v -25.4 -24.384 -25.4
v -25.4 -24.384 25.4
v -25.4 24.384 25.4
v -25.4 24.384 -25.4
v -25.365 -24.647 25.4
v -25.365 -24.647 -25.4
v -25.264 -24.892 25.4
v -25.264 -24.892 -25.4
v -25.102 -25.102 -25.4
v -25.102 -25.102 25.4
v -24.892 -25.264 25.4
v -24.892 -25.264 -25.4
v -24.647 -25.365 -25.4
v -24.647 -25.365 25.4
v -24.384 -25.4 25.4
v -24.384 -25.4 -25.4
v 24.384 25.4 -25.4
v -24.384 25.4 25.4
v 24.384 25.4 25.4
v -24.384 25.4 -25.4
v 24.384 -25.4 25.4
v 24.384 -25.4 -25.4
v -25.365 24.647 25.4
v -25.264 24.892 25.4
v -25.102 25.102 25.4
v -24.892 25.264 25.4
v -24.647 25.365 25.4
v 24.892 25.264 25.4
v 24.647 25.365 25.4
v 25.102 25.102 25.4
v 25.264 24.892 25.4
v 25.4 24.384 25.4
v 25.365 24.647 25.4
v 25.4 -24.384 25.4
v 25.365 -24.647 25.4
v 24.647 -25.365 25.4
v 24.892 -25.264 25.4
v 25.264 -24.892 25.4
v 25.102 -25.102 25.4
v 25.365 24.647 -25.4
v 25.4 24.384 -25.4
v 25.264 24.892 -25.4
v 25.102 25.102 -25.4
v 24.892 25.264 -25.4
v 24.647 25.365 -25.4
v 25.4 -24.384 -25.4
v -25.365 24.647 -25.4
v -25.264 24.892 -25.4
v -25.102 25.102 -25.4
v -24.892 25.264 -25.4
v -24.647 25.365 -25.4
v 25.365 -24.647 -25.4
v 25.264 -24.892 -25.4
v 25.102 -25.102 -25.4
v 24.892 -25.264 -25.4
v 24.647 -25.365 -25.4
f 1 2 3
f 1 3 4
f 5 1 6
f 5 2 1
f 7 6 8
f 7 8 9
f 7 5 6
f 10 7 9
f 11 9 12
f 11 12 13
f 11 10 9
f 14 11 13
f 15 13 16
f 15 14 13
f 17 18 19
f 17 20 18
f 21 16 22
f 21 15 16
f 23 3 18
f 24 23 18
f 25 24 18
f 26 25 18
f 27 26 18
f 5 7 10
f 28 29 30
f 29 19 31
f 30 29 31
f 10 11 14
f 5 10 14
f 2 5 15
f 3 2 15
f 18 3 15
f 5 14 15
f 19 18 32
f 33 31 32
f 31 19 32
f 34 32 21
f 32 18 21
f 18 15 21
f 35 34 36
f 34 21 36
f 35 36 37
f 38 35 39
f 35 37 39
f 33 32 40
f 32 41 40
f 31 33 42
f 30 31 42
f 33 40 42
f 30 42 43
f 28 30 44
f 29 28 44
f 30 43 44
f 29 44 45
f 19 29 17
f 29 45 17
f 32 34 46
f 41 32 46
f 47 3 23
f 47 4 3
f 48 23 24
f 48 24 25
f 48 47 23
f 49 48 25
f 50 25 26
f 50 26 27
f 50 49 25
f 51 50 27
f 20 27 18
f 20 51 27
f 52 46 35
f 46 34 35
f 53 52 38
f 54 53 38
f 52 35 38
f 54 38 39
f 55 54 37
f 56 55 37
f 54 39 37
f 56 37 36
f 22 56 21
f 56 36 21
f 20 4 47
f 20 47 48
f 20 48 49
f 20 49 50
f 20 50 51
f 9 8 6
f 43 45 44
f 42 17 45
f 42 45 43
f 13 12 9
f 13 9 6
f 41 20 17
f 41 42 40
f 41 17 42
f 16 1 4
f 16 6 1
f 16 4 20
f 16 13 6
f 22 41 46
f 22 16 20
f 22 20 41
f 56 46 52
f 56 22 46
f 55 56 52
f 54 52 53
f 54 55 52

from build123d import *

# Parameters (mm, degrees)
F0_W      = 50.8
F0_H      = 50.8
F1_DEPTH  = 25.4
F1_FACE_W = 50.8
F1_FACE_H = 50.8
F2_DEPTH  = 25.4
F3_R      = 1.016


with BuildPart() as f1:
    # F0 (on Front) → F1 (new body)
    with BuildSketch(Plane.XZ):
        Rectangle(F0_W, F0_H)
    extrude(amount=F1_DEPTH)

    # F1_face (on face) → F2 (join)
    with BuildSketch(Plane(origin=(0, 0, 0), x_dir=(1, 0, 0), z_dir=(0, 1, 0))):
        Rectangle(F1_FACE_W, F1_FACE_H)
    extrude(amount=F2_DEPTH)

    # F3
    f3_edges = [f1.edges().sort_by_distance(p)[0] for p in [
        (25.4, -25.4, 0),
        (25.4, 25.4, 0),
        (-25.4, 25.4, 0),
        (-25.4, -25.4, 0),
    ]]
    fillet(f3_edges, radius=F3_R)


solid = f1.part
